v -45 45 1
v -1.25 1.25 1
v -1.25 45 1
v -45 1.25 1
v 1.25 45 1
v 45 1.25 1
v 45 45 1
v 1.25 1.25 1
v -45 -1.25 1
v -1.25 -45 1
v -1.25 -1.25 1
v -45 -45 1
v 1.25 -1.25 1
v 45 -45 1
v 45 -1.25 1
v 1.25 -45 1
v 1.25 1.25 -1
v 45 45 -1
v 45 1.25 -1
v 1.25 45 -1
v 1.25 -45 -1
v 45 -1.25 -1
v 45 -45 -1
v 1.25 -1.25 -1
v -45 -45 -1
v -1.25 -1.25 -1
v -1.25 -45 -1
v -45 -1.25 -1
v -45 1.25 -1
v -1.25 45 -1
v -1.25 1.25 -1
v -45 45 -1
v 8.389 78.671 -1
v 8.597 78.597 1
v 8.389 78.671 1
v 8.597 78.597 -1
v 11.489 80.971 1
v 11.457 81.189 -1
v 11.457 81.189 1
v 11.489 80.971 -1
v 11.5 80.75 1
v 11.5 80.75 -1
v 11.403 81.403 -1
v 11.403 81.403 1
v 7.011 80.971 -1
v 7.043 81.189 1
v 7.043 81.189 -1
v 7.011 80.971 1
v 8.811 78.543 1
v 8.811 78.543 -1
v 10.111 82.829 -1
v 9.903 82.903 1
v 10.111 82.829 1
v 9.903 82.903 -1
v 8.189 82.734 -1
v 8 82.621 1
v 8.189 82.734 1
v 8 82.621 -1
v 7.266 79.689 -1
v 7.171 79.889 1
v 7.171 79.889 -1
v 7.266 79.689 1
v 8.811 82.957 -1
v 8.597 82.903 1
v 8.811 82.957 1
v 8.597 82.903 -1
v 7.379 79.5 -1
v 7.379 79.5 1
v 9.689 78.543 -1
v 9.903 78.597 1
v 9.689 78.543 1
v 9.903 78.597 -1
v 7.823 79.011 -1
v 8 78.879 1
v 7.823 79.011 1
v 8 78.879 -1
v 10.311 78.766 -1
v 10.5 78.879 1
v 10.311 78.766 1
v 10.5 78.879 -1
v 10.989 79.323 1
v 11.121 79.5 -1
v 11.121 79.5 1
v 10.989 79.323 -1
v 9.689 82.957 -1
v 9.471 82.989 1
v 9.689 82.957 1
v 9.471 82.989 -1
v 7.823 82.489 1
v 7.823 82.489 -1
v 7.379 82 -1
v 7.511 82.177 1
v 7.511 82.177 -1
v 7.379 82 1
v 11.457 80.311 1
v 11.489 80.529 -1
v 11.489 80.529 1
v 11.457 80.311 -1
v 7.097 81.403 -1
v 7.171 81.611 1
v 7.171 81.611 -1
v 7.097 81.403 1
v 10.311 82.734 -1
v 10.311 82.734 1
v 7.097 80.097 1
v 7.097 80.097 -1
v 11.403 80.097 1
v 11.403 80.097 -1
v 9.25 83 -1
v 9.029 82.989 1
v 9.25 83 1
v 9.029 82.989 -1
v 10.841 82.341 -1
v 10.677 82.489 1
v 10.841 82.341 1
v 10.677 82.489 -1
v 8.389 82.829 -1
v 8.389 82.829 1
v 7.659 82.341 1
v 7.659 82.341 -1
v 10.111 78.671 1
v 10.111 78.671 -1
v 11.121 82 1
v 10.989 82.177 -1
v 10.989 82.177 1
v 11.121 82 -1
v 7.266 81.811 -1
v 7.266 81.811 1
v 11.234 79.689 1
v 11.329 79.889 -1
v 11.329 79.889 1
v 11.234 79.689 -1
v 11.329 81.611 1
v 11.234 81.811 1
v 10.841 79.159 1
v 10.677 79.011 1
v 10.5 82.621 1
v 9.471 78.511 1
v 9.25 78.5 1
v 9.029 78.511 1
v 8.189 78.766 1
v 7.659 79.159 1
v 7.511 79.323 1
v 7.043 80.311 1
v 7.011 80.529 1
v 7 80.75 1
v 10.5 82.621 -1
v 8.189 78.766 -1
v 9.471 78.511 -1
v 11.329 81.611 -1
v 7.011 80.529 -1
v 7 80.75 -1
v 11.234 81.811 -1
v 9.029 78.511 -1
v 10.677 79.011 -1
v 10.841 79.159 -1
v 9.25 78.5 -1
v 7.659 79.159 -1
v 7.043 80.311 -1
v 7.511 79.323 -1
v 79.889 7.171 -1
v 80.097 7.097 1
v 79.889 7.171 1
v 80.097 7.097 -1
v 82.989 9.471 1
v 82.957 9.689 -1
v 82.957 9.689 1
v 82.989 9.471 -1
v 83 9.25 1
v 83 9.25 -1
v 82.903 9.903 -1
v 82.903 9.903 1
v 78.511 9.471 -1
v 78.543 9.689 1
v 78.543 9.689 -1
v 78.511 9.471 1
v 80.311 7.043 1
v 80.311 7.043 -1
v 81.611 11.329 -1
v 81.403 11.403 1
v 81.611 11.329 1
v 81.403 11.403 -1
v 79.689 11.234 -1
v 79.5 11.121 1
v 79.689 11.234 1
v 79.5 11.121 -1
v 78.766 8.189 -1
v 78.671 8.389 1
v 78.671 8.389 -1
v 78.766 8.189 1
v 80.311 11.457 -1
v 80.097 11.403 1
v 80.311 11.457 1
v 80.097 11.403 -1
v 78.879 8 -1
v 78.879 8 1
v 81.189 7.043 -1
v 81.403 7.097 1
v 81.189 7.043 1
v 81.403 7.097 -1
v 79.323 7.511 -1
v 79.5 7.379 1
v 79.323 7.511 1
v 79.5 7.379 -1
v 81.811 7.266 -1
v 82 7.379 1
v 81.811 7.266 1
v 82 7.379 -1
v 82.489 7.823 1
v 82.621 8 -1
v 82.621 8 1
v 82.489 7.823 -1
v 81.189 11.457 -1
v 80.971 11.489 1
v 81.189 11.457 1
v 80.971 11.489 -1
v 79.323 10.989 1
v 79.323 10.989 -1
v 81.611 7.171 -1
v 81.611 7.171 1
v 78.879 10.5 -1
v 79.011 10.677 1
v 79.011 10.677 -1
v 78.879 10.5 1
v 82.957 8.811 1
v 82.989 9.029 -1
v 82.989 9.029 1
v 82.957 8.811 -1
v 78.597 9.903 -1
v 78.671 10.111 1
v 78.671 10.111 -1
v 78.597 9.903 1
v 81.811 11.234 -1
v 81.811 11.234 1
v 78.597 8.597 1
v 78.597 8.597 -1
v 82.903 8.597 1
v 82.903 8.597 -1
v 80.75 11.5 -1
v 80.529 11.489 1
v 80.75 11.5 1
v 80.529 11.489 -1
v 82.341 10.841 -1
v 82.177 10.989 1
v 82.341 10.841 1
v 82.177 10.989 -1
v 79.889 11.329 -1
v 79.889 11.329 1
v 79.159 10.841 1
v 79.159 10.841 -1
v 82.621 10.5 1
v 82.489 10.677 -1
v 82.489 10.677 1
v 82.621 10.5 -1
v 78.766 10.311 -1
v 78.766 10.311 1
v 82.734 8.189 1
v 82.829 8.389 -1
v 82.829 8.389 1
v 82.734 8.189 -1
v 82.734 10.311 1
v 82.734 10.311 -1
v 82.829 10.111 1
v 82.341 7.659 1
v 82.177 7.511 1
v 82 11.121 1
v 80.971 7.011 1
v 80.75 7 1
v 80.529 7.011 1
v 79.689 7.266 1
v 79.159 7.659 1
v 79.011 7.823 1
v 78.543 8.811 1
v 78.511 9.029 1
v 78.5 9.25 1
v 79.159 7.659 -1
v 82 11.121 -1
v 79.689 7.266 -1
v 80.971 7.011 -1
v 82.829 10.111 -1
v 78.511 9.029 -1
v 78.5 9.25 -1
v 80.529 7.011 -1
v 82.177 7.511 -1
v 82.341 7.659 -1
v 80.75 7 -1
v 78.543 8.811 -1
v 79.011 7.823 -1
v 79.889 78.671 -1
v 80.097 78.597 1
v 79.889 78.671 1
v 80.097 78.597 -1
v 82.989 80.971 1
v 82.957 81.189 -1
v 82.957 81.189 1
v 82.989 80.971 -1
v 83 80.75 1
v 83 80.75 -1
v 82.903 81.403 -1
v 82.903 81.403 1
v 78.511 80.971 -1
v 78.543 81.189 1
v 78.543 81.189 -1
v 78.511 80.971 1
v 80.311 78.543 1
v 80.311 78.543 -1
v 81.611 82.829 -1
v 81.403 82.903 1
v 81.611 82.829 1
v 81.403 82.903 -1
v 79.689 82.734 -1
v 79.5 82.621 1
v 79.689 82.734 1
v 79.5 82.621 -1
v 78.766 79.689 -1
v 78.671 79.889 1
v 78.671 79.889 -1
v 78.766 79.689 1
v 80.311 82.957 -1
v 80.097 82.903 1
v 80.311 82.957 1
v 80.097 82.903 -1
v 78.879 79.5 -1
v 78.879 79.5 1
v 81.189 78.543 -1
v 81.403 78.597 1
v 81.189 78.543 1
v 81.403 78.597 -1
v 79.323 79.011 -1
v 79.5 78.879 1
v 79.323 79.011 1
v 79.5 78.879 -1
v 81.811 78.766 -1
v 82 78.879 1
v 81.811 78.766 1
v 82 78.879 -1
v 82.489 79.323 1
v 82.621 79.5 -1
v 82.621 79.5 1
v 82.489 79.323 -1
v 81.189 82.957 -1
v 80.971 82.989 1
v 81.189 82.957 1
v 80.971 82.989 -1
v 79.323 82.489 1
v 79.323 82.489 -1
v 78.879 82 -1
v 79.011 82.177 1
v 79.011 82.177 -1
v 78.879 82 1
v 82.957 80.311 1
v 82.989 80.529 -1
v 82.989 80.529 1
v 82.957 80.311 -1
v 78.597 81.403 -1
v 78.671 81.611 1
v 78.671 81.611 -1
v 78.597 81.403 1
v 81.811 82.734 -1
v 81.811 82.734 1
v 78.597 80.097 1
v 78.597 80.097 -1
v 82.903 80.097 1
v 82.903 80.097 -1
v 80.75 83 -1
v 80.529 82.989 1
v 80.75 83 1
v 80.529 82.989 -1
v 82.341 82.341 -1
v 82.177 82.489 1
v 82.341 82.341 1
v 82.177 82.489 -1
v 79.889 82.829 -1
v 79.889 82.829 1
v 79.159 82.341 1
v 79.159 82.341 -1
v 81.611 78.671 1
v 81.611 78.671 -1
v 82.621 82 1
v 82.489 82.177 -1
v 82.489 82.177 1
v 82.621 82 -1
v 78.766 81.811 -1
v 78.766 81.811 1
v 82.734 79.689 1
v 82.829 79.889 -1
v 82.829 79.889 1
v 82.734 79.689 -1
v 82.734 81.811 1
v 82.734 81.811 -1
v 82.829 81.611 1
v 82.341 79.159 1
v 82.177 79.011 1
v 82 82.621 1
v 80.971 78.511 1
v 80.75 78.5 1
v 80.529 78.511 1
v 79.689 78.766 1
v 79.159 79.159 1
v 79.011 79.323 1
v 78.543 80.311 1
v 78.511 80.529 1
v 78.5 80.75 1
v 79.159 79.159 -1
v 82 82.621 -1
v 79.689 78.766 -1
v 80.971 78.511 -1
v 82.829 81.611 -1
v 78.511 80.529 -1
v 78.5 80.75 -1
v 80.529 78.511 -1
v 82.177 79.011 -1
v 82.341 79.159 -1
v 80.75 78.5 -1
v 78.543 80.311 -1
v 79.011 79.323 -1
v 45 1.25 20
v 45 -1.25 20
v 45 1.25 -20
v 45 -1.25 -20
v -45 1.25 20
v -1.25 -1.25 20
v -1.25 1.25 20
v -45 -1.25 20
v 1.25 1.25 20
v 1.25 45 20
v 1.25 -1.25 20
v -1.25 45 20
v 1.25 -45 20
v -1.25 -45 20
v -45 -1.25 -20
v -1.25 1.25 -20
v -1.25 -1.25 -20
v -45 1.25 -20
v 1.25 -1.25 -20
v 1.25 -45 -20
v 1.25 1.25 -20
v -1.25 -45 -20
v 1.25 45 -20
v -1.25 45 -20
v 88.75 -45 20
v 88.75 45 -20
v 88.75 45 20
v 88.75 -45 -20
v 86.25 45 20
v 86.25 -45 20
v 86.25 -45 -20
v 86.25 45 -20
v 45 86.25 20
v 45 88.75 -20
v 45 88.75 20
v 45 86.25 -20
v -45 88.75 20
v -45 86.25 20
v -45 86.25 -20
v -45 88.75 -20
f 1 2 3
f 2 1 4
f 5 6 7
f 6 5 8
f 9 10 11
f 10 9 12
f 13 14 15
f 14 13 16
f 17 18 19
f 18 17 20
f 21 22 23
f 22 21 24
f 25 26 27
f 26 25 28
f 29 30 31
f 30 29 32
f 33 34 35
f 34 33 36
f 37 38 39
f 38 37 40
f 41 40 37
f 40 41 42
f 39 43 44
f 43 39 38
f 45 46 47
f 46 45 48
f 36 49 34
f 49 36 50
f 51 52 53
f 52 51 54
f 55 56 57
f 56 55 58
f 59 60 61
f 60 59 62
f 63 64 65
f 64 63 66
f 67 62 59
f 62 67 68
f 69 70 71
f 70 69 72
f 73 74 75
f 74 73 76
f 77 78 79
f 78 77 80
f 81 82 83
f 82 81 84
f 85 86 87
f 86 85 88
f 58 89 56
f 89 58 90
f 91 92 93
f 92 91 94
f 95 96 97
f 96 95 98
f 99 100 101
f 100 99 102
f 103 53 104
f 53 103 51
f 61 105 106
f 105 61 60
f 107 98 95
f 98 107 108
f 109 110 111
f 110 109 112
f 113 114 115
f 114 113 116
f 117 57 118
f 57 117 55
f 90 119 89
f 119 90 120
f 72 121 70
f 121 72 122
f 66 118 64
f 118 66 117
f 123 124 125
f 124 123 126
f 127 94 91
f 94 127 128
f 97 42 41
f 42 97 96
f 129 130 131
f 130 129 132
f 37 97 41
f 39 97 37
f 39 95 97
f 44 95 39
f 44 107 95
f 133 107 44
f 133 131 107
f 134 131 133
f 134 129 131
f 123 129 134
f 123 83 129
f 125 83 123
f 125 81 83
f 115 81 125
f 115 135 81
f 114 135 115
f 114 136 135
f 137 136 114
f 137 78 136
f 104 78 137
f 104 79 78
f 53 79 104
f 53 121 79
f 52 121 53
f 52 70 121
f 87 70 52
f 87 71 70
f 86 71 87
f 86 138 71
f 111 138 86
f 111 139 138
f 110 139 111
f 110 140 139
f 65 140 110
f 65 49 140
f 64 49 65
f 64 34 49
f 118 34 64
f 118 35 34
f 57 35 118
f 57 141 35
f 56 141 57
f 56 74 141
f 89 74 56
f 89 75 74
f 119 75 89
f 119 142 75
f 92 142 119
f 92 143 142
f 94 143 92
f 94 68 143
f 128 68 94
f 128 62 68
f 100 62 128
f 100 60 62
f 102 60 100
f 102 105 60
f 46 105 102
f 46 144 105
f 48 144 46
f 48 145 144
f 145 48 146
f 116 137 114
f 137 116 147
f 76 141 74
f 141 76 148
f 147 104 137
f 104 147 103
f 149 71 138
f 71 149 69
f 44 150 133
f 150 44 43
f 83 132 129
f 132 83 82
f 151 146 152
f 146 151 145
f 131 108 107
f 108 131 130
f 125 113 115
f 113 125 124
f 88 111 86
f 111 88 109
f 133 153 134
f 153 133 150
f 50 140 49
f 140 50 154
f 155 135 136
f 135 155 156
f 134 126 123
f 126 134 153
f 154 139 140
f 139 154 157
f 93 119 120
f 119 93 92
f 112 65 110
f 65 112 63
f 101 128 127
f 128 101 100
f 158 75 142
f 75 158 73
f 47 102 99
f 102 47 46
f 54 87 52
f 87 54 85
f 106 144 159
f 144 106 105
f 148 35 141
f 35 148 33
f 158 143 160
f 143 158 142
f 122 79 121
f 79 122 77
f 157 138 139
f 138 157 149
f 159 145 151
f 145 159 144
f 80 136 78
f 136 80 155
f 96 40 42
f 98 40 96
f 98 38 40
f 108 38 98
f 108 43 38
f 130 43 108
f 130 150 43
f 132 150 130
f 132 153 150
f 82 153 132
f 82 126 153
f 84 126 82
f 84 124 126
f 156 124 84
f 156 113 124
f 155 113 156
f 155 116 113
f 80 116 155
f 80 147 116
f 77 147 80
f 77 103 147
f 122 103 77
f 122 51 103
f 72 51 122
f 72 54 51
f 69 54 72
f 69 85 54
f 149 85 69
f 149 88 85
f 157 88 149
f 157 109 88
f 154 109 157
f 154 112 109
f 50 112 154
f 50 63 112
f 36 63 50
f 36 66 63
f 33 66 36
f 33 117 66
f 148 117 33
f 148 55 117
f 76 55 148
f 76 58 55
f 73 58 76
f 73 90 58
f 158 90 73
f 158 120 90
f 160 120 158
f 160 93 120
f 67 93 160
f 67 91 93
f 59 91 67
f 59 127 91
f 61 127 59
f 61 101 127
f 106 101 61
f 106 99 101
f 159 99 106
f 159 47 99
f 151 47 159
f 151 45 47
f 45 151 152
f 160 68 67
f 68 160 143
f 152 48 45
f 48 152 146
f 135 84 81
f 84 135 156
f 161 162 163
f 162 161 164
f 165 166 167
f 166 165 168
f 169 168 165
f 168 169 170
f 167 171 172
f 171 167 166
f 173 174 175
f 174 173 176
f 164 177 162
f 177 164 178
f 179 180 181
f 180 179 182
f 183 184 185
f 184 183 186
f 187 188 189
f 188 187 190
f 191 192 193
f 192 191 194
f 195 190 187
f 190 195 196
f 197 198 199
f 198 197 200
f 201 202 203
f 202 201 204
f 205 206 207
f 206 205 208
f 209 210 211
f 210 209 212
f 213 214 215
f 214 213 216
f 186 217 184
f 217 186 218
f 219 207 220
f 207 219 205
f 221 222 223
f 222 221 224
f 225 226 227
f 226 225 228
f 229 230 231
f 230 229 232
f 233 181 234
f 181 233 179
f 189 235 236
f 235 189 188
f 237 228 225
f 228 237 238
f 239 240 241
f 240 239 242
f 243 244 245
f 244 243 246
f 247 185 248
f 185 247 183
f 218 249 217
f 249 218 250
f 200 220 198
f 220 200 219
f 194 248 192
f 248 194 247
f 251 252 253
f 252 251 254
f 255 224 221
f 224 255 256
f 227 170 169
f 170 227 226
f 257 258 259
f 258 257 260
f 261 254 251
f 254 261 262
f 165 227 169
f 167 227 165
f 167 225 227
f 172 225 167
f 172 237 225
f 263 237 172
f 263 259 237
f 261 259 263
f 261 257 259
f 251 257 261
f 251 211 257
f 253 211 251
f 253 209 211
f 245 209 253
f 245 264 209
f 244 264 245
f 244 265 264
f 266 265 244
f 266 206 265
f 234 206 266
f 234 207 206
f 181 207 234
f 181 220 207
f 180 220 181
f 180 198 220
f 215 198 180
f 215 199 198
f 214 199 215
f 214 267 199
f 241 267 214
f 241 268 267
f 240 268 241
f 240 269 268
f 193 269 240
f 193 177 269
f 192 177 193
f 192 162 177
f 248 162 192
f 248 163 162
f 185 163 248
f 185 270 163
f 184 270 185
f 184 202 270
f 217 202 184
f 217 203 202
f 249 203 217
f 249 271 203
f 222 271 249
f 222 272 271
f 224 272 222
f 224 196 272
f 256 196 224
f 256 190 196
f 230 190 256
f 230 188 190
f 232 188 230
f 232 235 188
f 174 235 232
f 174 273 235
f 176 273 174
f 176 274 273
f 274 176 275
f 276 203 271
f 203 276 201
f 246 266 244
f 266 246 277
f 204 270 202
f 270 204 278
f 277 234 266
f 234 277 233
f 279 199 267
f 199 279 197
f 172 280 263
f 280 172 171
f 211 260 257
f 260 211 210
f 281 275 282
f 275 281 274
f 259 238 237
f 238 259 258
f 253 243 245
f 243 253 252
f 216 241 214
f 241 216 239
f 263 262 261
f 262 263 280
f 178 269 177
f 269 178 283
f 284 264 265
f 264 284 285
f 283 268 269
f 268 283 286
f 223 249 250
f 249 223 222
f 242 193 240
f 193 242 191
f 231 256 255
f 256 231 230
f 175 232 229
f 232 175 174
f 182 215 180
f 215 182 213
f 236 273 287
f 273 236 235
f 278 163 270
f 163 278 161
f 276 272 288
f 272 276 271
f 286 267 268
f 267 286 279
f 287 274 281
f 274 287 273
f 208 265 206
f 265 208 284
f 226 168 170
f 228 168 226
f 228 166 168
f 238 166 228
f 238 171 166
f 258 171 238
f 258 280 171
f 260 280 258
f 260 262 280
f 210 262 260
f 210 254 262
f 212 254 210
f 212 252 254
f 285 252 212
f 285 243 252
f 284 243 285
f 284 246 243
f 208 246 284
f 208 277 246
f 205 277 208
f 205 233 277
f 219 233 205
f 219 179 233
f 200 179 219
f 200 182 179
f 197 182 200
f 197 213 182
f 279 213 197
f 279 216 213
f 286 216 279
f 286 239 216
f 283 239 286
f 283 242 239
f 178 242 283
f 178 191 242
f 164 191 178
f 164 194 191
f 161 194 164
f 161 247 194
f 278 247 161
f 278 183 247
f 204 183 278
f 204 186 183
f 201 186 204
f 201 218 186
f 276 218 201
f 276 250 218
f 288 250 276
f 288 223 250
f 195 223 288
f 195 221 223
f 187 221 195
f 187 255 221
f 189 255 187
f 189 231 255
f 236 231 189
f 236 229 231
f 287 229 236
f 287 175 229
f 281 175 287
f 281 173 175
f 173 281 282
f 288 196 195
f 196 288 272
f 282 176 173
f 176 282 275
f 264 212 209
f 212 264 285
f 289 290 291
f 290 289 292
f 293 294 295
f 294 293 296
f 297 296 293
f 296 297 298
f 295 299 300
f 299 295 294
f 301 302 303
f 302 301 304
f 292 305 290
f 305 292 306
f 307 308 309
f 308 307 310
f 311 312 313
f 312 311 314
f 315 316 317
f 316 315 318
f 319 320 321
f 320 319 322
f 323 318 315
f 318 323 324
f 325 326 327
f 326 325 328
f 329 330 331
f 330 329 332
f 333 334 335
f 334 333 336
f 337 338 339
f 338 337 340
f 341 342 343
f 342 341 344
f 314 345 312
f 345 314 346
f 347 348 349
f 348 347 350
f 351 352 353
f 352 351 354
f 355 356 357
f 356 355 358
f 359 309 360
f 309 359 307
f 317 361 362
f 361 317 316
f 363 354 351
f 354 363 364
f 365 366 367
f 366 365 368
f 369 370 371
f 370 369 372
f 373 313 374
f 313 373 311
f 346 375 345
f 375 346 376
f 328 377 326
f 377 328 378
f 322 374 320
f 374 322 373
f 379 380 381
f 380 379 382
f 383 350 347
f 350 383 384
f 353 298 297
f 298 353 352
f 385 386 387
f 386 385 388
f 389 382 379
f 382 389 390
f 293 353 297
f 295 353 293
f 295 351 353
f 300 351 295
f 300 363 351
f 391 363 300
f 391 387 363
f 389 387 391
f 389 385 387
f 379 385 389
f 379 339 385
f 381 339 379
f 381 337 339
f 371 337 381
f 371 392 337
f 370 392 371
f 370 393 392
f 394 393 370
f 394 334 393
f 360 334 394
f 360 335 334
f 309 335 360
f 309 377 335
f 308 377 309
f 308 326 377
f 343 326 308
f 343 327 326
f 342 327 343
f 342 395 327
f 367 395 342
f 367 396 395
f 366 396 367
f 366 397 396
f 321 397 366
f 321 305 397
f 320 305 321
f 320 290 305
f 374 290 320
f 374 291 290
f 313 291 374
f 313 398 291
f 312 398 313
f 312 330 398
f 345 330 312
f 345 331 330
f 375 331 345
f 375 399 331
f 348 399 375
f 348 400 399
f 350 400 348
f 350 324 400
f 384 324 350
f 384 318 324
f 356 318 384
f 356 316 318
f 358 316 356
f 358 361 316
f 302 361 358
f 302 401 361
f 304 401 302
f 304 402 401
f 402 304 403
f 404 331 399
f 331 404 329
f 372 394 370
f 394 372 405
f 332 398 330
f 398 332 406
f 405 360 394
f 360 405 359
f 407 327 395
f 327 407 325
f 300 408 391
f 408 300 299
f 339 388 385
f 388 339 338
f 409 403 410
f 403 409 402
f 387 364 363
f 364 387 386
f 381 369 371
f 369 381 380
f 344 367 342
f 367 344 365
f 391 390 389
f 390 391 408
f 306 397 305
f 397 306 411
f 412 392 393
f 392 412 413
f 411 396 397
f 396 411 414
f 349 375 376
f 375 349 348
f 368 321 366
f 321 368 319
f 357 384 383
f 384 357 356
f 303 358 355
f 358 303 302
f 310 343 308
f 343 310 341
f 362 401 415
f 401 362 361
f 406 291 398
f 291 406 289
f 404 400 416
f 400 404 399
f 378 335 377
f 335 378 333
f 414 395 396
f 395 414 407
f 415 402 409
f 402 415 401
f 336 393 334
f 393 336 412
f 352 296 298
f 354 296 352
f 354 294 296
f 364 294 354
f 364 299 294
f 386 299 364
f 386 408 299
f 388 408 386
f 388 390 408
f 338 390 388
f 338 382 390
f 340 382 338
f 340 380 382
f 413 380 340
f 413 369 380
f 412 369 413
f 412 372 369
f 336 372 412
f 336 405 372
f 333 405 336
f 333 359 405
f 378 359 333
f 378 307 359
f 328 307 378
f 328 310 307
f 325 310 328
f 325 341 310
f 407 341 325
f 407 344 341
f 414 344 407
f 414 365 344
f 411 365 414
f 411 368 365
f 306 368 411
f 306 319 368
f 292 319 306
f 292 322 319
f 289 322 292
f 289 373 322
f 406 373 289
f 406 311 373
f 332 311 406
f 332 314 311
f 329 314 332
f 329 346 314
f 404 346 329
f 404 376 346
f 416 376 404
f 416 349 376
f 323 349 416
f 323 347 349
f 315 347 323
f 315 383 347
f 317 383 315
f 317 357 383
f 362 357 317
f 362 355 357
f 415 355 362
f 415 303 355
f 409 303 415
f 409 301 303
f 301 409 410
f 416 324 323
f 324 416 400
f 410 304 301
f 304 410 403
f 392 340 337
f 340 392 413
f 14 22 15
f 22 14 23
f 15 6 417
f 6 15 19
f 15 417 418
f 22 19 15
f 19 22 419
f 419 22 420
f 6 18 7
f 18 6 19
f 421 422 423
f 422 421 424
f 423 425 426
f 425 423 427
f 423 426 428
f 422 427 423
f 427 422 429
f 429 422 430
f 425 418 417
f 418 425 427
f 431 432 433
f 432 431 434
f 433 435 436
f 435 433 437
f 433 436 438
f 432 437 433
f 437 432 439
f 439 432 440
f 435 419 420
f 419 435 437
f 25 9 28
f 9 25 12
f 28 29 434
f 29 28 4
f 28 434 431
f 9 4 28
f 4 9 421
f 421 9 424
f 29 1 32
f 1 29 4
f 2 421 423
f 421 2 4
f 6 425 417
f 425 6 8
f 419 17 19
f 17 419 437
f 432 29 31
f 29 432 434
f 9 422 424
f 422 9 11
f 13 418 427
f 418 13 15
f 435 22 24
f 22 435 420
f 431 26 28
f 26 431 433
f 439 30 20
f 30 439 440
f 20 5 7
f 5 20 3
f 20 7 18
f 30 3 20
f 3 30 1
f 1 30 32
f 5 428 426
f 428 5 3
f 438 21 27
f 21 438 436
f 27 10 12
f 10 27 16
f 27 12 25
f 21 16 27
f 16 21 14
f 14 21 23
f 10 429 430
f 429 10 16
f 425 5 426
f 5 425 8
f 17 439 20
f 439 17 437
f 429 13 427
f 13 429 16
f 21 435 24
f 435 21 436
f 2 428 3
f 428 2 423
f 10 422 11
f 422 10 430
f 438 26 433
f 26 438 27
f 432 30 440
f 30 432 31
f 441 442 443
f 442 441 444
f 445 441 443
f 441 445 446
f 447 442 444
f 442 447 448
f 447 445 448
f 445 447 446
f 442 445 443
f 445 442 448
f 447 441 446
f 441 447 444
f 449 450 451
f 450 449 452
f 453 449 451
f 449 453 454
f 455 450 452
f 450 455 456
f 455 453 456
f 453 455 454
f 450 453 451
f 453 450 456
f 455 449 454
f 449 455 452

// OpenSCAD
// Dimensions for DIY magnetic stirrer housing from 80mm PC case fan
$fn = 64;

// Outer size of housing (X x Y)
outer_size_x = 90;
outer_size_y = 90;

// Wall thickness (2.5 mm)
wall_thickness = 2.5;

// Top plate thickness (2 mm)
top_thickness = 2.0;

// Height of housing (from z=0 to z=40)
housing_height = 40;

// Hole diameter (4.5 mm) for M4 screws
hole_diameter = 4.5;

// Screw hole pattern (71.5 mm square, centered on top plate)
hole_spacing = 71.5;

// Power cable notch: 12 mm wide, centered along the wall, reaching 8 mm down from open edge (from z=32 to z=40)
notch_width = 12;
notch_depth = 8;

// Correct the model so that:
// - The housing is properly centered and starts at z=0
// - The top plate lies on z=0 to z=2, and walls rise to z=40
// - The part is watertight and fully solid with correct geometry

// Create the housing as a union of top plate and walls
// We must ensure the entire part is built from z=0 upward, with the top plate at z=0 to z=2

// Top plate: 90x90x2 mm, at z=0 to z=2
cube([outer_size_x, outer_size_y, top_thickness], center=true);

// Four walls: 2.5 mm thick, extending from z=0 to z=40 (not from z=2)
// Wall on left (x=0 to x=90)
translate([0, 0, 0]) 
    cube([wall_thickness, outer_size_y, housing_height], center=true);

// Wall on right (x=90 to x=0)
translate([outer_size_x - wall_thickness, 0, 0]) 
    cube([wall_thickness, outer_size_y, housing_height], center=true);

// Wall on front (y=0 to y=90)
translate([0, 0, 0]) 
    cube([outer_size_x, wall_thickness, housing_height], center=true);

// Wall on back (y=90 to y=0)
translate([0, outer_size_y - wall_thickness, 0]) 
    cube([outer_size_x, wall_thickness, housing_height], center=true);

// Now drill four 4.5 mm holes for M4 screws on the top plate
// Holes centered on top plate (z=0 to z=2), 71.5 mm apart, centered at (45,45)
for (i = [0, 1]) {
    for (j = [0, 1]) {
        translate([
            45 - hole_spacing/2 + i * hole_spacing,
            45 - hole_spacing/2 + j * hole_spacing,
            0
        ]) 
        cylinder(d=hole_diameter, h=top_thickness, center=true);
    }
}

// Cut a notch for power cable in the front wall (say, at z=32 to z=40)
// Notch: 12 mm wide, centered in y, from z=32 to z=40 (8 mm deep)
// Position: centered at x=45, from y=0 to y=12
// We cut a rectangular notch from z=32 to z=40, 12 mm wide, centered in y
translate([0, 0, 0]) // start at z=0
difference() {
    // Front wall: 90x2.5x40, from z=0 to z=40
    cube([outer_size_x, wall_thickness, housing_height], center=true);
    
    // Notch: 12 mm wide, centered in y, from z=32 to z=40
    // Notch goes from z=32 to z=40 (8 mm deep), 12 mm wide, centered at y=45
    translate([0, 0, 32]) 
        cube([outer_size_x, notch_width, notch_depth], center=true);
}
